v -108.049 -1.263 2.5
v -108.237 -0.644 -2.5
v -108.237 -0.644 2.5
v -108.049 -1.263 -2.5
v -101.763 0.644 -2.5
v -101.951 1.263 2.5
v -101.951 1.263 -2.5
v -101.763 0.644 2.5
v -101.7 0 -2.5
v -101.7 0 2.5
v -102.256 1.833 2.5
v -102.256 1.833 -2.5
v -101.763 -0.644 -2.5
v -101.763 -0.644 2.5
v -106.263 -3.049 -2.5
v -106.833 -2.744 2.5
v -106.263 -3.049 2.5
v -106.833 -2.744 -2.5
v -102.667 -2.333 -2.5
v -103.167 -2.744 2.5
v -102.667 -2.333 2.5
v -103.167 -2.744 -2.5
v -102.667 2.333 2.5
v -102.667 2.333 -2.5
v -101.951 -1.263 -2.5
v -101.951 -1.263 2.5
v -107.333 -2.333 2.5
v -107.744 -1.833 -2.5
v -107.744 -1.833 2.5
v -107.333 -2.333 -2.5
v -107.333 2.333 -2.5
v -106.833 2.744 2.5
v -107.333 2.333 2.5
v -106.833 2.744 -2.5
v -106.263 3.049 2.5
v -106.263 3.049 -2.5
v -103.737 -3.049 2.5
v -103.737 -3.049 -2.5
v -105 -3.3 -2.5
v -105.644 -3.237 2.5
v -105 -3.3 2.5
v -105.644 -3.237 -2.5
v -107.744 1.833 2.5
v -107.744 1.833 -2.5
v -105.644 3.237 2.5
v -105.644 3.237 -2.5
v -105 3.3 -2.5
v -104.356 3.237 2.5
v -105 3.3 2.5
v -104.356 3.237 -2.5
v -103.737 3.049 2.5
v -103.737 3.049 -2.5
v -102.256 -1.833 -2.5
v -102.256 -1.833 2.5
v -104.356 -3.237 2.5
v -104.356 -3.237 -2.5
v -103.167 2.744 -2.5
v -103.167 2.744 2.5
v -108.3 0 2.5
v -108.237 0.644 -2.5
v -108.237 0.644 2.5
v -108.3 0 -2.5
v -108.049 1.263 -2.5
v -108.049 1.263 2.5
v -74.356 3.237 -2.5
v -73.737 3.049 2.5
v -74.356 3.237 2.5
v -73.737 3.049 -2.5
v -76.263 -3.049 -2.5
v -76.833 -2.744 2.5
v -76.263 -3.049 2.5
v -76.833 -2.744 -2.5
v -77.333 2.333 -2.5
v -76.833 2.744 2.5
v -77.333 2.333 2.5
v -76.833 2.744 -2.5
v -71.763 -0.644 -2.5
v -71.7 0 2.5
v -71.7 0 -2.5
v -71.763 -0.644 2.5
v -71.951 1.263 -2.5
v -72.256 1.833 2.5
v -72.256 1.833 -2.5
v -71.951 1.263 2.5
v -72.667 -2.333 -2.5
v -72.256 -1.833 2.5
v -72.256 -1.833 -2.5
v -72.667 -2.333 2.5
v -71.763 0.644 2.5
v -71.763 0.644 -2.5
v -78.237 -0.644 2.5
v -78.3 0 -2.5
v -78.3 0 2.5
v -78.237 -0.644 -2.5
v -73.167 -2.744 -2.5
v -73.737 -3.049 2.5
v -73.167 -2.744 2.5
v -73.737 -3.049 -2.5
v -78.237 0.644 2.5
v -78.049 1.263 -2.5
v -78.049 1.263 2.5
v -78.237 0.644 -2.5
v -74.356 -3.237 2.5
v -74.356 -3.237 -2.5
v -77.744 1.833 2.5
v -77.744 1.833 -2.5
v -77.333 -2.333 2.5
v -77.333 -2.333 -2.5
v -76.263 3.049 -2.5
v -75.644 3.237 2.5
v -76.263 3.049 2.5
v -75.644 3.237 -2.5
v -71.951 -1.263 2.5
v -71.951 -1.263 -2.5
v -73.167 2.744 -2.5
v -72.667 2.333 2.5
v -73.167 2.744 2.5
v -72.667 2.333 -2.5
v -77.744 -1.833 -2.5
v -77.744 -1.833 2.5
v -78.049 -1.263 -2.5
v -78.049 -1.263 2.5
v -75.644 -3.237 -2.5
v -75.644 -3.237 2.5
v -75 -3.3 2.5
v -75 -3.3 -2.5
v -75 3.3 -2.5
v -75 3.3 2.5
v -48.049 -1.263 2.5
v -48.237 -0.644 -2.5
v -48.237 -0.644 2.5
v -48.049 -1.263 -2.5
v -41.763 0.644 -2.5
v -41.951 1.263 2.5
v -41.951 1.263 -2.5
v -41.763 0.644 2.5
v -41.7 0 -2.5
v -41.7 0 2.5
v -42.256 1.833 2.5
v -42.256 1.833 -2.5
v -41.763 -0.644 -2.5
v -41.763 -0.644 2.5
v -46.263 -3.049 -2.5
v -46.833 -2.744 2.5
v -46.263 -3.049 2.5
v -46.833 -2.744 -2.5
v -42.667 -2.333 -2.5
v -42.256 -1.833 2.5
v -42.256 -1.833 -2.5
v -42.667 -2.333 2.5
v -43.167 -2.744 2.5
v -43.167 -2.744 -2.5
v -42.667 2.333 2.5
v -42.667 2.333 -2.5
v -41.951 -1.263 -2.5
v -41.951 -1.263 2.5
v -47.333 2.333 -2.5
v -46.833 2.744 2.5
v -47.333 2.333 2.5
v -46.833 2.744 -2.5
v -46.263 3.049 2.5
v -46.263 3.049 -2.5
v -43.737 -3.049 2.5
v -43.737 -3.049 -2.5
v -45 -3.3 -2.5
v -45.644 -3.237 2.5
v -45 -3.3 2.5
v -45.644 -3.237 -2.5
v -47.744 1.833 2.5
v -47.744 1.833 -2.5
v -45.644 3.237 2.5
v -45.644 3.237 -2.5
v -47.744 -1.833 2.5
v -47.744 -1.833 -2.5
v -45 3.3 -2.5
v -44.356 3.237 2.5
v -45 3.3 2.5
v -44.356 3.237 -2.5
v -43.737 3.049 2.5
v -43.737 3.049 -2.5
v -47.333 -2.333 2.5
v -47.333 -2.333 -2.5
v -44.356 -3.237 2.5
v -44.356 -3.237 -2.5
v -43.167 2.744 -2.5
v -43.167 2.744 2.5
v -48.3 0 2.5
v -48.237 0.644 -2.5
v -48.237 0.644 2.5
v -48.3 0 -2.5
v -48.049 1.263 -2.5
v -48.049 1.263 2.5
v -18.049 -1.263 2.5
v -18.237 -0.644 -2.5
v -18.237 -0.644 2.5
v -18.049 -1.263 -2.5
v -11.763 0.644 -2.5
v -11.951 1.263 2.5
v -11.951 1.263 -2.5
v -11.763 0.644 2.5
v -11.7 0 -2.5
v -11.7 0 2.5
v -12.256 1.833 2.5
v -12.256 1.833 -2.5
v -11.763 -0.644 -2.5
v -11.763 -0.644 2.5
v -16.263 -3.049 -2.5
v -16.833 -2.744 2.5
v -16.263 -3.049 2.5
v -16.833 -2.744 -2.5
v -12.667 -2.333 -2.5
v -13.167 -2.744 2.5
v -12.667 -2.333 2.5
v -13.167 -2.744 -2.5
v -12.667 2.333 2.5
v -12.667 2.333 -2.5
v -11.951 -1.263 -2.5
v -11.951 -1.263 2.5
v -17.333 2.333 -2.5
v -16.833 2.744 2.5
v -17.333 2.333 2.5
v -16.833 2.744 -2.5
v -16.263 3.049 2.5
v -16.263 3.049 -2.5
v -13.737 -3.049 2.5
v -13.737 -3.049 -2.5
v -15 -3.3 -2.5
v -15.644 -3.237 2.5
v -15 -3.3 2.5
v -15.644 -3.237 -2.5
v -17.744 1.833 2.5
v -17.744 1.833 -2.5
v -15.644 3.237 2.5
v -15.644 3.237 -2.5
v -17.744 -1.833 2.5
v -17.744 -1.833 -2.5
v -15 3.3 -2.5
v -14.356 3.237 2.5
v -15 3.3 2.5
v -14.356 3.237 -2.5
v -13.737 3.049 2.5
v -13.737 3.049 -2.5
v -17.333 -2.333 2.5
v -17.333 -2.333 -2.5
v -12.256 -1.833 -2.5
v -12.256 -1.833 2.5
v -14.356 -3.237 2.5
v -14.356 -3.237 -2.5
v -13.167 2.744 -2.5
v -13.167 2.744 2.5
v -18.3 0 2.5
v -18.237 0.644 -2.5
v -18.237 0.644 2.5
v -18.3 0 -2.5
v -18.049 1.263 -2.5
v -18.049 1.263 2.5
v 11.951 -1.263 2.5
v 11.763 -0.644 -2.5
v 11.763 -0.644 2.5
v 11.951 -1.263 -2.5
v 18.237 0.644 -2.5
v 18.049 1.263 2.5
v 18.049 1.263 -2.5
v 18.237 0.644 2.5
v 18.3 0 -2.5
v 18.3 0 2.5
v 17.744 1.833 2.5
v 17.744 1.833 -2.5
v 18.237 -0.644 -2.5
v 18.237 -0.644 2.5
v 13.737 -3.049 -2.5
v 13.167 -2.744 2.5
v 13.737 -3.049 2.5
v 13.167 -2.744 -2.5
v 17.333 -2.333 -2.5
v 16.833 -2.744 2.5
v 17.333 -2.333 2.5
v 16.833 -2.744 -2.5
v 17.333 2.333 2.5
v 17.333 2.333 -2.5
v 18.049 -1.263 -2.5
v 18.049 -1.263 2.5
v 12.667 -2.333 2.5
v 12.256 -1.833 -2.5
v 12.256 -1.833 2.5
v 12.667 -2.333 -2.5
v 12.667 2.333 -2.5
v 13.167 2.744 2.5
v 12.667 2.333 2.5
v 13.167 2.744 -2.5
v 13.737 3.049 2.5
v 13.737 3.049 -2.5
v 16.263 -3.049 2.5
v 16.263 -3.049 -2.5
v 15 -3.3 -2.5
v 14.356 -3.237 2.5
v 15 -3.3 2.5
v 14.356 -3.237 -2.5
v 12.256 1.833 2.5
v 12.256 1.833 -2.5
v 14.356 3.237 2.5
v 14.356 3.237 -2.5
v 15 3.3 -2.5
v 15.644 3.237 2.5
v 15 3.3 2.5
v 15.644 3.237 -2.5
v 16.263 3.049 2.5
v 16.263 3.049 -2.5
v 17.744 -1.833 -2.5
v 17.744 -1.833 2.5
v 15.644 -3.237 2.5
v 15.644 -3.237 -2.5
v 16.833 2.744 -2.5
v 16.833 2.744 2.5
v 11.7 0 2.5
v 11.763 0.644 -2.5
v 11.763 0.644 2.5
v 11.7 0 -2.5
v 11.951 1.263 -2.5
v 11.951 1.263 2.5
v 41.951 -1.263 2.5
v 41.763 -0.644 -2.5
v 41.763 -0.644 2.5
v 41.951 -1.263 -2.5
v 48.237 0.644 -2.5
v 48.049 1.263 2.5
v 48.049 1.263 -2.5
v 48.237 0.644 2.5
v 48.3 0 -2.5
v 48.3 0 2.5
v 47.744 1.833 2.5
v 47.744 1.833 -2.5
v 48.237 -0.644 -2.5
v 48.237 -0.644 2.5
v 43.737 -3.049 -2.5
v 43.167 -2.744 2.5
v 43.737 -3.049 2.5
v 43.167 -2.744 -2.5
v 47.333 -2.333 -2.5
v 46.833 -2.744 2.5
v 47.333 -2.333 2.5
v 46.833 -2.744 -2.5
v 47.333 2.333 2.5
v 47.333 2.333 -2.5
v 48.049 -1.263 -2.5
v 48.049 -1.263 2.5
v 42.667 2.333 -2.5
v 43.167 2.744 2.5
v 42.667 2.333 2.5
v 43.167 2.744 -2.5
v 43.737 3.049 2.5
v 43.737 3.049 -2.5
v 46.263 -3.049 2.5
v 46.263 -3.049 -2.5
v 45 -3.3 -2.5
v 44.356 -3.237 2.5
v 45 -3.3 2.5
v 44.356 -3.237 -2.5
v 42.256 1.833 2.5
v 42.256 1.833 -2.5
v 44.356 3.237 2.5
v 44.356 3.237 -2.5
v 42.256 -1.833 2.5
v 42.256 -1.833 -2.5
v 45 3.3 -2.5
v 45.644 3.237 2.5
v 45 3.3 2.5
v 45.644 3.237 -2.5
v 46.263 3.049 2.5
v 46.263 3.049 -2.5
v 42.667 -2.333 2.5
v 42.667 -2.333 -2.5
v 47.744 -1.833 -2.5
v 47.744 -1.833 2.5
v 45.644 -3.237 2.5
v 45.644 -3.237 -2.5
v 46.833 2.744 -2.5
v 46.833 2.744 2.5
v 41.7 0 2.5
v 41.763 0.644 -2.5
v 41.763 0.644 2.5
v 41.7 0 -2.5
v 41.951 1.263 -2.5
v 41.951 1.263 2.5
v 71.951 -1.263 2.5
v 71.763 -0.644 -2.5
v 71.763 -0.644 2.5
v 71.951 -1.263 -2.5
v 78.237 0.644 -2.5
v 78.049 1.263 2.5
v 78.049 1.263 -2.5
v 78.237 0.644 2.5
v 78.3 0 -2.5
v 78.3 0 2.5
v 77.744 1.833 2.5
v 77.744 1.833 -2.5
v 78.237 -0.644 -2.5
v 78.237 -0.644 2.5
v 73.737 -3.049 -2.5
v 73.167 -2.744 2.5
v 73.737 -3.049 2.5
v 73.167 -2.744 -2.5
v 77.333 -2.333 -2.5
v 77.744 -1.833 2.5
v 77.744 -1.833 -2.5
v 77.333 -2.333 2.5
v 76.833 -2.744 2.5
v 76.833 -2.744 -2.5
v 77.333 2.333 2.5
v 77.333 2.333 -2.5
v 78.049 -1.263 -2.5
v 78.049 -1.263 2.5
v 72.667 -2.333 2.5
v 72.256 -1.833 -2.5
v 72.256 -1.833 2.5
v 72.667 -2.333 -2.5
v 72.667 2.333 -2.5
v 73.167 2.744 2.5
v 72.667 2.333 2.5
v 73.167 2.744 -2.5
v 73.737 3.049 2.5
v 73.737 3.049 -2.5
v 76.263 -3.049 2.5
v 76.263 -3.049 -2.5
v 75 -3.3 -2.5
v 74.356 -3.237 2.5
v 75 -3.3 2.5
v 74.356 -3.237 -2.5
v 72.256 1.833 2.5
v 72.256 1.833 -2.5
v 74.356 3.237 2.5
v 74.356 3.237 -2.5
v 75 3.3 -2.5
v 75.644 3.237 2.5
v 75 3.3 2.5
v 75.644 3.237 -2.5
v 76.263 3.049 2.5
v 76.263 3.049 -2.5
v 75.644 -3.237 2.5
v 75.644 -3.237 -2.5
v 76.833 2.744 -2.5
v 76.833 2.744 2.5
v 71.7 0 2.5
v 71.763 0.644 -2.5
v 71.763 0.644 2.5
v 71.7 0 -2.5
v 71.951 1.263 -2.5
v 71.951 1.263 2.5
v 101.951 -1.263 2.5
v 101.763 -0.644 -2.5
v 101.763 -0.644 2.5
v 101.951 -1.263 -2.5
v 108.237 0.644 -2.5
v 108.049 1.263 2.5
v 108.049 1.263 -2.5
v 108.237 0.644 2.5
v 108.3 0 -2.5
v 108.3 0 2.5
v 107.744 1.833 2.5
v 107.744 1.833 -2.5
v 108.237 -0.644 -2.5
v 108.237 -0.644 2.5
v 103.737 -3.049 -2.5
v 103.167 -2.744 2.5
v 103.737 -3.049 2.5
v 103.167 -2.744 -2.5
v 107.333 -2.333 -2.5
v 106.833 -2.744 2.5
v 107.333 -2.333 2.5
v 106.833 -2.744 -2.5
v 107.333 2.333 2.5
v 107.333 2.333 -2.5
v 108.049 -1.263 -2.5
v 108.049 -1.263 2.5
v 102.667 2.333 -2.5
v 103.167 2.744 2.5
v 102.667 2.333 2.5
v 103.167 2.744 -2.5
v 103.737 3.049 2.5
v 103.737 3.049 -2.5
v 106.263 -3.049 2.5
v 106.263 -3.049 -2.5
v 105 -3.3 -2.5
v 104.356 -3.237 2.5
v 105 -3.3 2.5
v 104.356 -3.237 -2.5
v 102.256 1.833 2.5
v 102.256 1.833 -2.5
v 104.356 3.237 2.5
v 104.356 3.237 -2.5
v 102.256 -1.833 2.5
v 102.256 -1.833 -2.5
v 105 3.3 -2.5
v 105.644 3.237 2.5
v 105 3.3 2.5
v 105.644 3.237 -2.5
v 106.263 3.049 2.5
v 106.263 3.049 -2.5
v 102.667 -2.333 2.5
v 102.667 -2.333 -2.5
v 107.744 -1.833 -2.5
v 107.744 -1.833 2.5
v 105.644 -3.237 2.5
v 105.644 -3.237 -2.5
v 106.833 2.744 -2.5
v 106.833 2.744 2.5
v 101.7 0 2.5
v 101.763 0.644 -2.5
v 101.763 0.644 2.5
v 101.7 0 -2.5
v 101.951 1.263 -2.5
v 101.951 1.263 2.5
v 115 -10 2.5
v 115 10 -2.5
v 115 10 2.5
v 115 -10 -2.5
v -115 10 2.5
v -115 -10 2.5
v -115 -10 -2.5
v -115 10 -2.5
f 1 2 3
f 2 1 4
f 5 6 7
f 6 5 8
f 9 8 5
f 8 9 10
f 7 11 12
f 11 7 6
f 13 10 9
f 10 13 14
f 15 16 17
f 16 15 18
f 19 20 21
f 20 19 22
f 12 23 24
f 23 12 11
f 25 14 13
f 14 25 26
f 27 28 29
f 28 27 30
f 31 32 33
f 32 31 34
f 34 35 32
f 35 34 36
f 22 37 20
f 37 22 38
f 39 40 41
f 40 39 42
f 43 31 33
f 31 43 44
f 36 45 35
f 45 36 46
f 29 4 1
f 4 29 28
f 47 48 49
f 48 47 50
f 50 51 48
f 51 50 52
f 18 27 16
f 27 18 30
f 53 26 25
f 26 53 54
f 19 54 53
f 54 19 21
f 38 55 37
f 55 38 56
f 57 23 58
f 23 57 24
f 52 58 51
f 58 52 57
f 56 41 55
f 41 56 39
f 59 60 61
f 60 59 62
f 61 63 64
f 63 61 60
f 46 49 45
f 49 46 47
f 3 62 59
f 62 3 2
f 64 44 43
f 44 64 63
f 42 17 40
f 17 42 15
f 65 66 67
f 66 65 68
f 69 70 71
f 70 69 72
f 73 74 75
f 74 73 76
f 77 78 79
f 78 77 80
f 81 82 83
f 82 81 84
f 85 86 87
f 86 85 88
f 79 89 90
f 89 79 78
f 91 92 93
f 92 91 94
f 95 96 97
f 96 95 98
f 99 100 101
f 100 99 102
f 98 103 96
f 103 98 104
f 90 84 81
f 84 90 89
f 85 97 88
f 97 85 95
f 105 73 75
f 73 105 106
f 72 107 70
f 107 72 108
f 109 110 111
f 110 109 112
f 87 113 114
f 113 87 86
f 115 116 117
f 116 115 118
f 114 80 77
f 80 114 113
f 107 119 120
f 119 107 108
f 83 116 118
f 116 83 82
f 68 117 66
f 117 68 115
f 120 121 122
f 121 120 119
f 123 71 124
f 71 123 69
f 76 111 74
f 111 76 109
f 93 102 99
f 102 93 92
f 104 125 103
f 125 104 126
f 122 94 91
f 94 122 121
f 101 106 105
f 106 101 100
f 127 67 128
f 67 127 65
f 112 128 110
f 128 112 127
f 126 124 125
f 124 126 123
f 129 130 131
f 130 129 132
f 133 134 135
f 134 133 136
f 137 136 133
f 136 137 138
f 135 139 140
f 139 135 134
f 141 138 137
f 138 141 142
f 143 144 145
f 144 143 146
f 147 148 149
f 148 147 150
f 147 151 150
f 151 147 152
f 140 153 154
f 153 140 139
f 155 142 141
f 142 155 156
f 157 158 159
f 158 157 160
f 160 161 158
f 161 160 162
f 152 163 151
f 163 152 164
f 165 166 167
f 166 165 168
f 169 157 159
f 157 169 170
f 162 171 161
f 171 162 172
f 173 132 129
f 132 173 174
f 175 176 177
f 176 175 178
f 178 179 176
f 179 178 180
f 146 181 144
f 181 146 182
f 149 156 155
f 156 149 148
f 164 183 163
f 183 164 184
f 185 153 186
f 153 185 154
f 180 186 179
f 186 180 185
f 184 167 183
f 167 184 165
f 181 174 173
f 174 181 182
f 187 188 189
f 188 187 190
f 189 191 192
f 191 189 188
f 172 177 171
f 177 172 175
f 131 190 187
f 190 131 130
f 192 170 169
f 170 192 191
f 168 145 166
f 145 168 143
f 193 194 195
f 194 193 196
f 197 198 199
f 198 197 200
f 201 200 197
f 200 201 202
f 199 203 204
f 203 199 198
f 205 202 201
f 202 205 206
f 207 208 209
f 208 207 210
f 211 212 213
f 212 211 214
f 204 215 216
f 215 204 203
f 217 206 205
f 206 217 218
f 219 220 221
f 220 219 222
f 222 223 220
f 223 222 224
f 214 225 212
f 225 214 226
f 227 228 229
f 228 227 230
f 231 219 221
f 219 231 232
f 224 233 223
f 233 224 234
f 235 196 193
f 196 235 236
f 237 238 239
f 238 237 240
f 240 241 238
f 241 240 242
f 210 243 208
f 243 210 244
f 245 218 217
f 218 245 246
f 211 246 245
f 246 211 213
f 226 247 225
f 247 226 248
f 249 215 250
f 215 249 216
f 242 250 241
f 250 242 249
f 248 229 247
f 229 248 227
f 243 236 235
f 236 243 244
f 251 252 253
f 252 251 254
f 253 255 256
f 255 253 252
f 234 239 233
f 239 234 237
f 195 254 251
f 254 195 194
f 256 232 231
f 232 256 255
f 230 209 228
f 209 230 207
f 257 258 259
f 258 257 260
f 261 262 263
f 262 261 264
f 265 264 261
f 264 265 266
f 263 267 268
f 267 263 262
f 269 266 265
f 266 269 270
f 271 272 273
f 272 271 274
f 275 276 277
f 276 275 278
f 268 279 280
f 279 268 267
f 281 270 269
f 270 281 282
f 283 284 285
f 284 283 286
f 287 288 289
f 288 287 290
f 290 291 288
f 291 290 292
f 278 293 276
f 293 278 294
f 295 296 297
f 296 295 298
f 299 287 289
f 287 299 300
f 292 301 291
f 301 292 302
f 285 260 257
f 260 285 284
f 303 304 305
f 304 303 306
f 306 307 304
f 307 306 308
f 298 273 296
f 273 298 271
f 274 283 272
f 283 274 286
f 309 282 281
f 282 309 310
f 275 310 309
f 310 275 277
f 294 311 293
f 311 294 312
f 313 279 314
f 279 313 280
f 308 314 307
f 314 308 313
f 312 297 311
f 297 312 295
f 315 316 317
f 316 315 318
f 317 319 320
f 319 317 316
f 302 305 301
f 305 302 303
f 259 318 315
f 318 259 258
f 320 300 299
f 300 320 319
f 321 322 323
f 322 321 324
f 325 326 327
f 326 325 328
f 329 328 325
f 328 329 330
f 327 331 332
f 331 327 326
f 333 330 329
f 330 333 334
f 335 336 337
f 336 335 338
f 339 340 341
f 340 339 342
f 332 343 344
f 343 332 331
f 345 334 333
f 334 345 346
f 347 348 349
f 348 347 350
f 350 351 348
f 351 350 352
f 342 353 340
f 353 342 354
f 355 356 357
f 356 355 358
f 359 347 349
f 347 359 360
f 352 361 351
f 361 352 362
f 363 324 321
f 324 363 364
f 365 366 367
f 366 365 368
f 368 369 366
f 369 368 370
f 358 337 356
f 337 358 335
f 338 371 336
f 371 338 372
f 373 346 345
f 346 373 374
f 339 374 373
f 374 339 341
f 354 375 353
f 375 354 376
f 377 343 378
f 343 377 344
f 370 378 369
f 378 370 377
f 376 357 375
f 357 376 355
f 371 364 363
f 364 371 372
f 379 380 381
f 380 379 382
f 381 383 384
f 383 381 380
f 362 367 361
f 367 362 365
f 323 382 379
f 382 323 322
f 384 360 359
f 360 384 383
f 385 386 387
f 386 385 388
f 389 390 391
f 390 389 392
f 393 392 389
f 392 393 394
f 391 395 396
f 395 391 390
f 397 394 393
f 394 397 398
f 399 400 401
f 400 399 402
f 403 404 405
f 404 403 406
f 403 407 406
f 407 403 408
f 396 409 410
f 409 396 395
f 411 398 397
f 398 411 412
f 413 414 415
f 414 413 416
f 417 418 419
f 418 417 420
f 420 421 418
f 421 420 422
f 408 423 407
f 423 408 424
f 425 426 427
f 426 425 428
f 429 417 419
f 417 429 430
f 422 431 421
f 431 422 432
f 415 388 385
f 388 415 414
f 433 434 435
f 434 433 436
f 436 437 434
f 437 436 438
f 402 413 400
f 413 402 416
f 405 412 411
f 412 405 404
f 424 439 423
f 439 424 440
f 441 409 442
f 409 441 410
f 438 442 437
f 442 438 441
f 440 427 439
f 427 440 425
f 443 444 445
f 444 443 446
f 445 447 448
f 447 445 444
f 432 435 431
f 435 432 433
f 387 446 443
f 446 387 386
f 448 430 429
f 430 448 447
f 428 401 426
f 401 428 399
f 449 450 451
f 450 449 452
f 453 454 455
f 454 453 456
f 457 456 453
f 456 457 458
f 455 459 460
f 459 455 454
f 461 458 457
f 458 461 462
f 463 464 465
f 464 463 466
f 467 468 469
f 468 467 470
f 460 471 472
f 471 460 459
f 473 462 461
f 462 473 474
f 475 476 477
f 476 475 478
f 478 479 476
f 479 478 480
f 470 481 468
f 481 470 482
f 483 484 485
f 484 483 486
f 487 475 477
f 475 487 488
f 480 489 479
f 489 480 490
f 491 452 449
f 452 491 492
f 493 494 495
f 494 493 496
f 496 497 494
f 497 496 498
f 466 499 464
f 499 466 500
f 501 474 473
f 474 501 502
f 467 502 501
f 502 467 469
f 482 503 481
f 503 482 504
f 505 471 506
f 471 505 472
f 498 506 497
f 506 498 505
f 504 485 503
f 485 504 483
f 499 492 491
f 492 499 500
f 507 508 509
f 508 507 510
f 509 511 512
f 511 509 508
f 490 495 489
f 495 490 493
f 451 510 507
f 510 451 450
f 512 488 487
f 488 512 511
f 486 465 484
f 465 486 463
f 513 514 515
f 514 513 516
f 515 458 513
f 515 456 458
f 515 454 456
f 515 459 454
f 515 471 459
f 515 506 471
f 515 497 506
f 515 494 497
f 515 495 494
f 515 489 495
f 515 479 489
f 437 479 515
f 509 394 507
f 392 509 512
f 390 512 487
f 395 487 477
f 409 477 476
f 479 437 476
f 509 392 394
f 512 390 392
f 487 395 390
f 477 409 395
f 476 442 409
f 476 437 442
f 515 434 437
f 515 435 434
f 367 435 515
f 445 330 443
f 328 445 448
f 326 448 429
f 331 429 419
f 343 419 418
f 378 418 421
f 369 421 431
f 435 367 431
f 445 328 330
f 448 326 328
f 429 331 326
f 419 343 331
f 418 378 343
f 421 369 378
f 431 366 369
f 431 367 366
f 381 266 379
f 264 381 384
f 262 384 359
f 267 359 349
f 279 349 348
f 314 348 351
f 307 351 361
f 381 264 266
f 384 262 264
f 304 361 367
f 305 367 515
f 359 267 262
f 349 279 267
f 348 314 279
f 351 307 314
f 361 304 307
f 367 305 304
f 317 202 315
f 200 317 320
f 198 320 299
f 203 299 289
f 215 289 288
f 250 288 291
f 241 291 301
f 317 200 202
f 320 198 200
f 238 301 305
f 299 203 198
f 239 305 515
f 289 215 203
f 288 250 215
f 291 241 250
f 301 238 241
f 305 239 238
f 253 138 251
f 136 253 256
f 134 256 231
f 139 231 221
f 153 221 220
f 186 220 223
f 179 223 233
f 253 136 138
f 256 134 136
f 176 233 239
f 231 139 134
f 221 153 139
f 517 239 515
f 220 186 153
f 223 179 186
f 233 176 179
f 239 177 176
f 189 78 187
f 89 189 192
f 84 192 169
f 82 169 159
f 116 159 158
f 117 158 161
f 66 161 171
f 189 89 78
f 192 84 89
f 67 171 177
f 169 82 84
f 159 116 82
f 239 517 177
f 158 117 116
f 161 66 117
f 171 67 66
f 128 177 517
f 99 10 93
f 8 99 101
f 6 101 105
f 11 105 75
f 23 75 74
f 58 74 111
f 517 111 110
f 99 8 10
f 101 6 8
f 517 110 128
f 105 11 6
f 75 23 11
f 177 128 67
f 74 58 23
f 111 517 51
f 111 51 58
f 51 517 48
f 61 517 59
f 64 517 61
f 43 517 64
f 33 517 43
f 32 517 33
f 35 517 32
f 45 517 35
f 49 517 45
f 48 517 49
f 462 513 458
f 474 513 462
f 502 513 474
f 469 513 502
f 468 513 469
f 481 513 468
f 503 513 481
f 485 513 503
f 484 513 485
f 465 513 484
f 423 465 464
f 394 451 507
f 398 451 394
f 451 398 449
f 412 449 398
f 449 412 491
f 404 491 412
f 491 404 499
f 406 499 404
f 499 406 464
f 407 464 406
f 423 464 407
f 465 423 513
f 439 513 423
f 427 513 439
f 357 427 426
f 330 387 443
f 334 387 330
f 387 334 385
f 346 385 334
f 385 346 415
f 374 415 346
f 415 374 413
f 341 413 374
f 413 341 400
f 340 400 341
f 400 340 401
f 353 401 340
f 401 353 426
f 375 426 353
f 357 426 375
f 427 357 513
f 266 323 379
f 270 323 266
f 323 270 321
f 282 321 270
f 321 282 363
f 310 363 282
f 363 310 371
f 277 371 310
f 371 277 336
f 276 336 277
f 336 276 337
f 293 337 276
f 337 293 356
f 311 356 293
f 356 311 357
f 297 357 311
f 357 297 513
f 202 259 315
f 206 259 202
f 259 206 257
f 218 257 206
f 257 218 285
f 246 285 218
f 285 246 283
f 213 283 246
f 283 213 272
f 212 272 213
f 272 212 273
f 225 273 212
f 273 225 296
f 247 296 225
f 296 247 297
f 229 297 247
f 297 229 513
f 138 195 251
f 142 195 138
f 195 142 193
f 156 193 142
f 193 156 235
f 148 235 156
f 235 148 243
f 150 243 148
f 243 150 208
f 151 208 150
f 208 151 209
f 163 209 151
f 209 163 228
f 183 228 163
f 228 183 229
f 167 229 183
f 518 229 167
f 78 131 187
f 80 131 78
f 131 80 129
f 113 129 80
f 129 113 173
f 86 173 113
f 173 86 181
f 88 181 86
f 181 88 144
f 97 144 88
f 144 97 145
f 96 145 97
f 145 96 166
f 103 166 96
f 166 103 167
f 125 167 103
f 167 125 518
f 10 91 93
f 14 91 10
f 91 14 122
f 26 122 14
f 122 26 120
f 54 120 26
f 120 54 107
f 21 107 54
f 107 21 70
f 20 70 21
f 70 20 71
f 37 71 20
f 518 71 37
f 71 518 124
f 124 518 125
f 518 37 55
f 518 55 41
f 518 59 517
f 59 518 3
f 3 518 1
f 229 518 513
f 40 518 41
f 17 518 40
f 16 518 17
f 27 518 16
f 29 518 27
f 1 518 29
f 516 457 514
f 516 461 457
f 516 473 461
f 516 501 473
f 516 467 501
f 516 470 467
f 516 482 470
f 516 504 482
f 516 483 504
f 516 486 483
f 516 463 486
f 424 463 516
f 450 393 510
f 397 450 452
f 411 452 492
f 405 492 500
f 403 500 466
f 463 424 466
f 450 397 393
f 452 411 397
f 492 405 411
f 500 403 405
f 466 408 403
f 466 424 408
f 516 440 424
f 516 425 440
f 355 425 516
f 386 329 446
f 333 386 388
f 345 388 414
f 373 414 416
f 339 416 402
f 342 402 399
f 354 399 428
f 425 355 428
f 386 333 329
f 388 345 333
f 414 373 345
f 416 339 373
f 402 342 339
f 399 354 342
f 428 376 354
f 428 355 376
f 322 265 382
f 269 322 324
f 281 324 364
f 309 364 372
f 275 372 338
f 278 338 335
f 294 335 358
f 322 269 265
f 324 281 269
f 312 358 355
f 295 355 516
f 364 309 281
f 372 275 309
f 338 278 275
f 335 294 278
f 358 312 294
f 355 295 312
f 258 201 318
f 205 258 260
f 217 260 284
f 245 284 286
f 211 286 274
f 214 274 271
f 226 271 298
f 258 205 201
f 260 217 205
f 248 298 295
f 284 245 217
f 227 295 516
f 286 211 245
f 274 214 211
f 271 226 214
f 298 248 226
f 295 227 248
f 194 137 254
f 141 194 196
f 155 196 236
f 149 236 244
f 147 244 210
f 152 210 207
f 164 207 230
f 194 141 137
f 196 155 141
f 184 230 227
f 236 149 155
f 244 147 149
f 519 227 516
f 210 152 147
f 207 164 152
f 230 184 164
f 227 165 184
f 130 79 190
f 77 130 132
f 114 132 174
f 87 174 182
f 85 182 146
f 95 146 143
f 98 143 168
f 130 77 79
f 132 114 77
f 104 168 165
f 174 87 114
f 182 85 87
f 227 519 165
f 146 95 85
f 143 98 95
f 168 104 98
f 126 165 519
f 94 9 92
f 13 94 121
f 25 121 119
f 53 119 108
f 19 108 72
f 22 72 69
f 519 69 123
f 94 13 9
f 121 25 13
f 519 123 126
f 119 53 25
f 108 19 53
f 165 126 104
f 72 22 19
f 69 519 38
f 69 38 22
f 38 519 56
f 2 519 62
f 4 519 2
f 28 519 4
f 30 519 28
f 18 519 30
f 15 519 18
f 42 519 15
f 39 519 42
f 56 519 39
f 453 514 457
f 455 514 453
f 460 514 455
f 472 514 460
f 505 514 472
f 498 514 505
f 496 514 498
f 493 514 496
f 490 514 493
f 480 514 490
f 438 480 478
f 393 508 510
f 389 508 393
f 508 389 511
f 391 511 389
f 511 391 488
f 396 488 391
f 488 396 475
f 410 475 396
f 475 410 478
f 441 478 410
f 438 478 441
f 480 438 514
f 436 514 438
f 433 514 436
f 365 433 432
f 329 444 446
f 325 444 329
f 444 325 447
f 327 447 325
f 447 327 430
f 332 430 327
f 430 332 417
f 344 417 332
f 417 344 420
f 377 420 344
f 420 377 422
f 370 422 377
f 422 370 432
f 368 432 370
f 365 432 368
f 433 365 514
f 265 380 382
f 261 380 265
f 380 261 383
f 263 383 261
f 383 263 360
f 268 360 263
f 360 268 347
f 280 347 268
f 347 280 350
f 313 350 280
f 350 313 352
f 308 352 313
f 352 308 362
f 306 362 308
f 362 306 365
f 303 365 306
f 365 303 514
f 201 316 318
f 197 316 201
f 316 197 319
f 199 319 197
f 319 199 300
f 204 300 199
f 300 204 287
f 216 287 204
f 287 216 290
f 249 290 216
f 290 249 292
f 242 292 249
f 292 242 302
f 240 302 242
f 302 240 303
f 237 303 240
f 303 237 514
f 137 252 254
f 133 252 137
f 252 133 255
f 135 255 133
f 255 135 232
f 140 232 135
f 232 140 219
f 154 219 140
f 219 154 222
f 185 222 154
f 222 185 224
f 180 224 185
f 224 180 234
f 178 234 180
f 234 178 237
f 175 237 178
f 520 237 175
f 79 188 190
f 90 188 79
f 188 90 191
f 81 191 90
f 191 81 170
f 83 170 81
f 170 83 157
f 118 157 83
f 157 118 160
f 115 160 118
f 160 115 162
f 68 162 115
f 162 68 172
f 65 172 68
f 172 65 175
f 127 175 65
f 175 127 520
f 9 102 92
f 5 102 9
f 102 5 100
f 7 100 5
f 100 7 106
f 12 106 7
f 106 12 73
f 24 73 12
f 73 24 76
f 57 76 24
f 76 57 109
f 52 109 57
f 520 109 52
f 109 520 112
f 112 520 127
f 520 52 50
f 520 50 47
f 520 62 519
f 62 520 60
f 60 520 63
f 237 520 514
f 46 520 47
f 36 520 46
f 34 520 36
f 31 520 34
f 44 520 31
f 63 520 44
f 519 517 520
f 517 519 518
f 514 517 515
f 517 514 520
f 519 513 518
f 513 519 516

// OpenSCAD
$fn = 32;

// ----------------------------------------------------------------------
// Hole bar, 8 x Ø6.6
// skip layout, 10 mm edge offset
// ----------------------------------------------------------------------

// --- parameters (mm) ---
bar_w = 20;       // bar width (Y)
bar_t = 5;        // bar thickness (Z)
holes = 8;        // holes per row
hole_d = 6.6;     // hole diameter
edge = 10;        // offset from the bar end to the first hole
grid_pitch = 15;  // grid the bar was laid out on

// --- derived feature positions (mm) ---
pitch = grid_pitch * 2;       // = 30   holes sit every other grid slot
span = (holes - 1) * pitch;   // = 210   distance between the end holes
bar_l = span + 2 * edge;      // = 230   overall bar length
start_x = -bar_l / 2 + edge;  // = -105   X of the first hole
feature_centers = [
  [start_x + 0 * pitch, 0],
  [start_x + 1 * pitch, 0],
  [start_x + 2 * pitch, 0],
  [start_x + 3 * pitch, 0],
  [start_x + 4 * pitch, 0],
  [start_x + 5 * pitch, 0],
  [start_x + 6 * pitch, 0],
  [start_x + 7 * pitch, 0]
];   // hole centres of the first row

// bar with one row of holes, drilled from feature_centers
difference() {
  translate([-bar_l / 2, -bar_w / 2, -bar_t / 2]) cube([bar_l, bar_w, bar_t]);
  for (centre = feature_centers)
    translate([centre[0], centre[1], 0])
      cylinder(d = hole_d, h = bar_t + 2, center = true);
}
